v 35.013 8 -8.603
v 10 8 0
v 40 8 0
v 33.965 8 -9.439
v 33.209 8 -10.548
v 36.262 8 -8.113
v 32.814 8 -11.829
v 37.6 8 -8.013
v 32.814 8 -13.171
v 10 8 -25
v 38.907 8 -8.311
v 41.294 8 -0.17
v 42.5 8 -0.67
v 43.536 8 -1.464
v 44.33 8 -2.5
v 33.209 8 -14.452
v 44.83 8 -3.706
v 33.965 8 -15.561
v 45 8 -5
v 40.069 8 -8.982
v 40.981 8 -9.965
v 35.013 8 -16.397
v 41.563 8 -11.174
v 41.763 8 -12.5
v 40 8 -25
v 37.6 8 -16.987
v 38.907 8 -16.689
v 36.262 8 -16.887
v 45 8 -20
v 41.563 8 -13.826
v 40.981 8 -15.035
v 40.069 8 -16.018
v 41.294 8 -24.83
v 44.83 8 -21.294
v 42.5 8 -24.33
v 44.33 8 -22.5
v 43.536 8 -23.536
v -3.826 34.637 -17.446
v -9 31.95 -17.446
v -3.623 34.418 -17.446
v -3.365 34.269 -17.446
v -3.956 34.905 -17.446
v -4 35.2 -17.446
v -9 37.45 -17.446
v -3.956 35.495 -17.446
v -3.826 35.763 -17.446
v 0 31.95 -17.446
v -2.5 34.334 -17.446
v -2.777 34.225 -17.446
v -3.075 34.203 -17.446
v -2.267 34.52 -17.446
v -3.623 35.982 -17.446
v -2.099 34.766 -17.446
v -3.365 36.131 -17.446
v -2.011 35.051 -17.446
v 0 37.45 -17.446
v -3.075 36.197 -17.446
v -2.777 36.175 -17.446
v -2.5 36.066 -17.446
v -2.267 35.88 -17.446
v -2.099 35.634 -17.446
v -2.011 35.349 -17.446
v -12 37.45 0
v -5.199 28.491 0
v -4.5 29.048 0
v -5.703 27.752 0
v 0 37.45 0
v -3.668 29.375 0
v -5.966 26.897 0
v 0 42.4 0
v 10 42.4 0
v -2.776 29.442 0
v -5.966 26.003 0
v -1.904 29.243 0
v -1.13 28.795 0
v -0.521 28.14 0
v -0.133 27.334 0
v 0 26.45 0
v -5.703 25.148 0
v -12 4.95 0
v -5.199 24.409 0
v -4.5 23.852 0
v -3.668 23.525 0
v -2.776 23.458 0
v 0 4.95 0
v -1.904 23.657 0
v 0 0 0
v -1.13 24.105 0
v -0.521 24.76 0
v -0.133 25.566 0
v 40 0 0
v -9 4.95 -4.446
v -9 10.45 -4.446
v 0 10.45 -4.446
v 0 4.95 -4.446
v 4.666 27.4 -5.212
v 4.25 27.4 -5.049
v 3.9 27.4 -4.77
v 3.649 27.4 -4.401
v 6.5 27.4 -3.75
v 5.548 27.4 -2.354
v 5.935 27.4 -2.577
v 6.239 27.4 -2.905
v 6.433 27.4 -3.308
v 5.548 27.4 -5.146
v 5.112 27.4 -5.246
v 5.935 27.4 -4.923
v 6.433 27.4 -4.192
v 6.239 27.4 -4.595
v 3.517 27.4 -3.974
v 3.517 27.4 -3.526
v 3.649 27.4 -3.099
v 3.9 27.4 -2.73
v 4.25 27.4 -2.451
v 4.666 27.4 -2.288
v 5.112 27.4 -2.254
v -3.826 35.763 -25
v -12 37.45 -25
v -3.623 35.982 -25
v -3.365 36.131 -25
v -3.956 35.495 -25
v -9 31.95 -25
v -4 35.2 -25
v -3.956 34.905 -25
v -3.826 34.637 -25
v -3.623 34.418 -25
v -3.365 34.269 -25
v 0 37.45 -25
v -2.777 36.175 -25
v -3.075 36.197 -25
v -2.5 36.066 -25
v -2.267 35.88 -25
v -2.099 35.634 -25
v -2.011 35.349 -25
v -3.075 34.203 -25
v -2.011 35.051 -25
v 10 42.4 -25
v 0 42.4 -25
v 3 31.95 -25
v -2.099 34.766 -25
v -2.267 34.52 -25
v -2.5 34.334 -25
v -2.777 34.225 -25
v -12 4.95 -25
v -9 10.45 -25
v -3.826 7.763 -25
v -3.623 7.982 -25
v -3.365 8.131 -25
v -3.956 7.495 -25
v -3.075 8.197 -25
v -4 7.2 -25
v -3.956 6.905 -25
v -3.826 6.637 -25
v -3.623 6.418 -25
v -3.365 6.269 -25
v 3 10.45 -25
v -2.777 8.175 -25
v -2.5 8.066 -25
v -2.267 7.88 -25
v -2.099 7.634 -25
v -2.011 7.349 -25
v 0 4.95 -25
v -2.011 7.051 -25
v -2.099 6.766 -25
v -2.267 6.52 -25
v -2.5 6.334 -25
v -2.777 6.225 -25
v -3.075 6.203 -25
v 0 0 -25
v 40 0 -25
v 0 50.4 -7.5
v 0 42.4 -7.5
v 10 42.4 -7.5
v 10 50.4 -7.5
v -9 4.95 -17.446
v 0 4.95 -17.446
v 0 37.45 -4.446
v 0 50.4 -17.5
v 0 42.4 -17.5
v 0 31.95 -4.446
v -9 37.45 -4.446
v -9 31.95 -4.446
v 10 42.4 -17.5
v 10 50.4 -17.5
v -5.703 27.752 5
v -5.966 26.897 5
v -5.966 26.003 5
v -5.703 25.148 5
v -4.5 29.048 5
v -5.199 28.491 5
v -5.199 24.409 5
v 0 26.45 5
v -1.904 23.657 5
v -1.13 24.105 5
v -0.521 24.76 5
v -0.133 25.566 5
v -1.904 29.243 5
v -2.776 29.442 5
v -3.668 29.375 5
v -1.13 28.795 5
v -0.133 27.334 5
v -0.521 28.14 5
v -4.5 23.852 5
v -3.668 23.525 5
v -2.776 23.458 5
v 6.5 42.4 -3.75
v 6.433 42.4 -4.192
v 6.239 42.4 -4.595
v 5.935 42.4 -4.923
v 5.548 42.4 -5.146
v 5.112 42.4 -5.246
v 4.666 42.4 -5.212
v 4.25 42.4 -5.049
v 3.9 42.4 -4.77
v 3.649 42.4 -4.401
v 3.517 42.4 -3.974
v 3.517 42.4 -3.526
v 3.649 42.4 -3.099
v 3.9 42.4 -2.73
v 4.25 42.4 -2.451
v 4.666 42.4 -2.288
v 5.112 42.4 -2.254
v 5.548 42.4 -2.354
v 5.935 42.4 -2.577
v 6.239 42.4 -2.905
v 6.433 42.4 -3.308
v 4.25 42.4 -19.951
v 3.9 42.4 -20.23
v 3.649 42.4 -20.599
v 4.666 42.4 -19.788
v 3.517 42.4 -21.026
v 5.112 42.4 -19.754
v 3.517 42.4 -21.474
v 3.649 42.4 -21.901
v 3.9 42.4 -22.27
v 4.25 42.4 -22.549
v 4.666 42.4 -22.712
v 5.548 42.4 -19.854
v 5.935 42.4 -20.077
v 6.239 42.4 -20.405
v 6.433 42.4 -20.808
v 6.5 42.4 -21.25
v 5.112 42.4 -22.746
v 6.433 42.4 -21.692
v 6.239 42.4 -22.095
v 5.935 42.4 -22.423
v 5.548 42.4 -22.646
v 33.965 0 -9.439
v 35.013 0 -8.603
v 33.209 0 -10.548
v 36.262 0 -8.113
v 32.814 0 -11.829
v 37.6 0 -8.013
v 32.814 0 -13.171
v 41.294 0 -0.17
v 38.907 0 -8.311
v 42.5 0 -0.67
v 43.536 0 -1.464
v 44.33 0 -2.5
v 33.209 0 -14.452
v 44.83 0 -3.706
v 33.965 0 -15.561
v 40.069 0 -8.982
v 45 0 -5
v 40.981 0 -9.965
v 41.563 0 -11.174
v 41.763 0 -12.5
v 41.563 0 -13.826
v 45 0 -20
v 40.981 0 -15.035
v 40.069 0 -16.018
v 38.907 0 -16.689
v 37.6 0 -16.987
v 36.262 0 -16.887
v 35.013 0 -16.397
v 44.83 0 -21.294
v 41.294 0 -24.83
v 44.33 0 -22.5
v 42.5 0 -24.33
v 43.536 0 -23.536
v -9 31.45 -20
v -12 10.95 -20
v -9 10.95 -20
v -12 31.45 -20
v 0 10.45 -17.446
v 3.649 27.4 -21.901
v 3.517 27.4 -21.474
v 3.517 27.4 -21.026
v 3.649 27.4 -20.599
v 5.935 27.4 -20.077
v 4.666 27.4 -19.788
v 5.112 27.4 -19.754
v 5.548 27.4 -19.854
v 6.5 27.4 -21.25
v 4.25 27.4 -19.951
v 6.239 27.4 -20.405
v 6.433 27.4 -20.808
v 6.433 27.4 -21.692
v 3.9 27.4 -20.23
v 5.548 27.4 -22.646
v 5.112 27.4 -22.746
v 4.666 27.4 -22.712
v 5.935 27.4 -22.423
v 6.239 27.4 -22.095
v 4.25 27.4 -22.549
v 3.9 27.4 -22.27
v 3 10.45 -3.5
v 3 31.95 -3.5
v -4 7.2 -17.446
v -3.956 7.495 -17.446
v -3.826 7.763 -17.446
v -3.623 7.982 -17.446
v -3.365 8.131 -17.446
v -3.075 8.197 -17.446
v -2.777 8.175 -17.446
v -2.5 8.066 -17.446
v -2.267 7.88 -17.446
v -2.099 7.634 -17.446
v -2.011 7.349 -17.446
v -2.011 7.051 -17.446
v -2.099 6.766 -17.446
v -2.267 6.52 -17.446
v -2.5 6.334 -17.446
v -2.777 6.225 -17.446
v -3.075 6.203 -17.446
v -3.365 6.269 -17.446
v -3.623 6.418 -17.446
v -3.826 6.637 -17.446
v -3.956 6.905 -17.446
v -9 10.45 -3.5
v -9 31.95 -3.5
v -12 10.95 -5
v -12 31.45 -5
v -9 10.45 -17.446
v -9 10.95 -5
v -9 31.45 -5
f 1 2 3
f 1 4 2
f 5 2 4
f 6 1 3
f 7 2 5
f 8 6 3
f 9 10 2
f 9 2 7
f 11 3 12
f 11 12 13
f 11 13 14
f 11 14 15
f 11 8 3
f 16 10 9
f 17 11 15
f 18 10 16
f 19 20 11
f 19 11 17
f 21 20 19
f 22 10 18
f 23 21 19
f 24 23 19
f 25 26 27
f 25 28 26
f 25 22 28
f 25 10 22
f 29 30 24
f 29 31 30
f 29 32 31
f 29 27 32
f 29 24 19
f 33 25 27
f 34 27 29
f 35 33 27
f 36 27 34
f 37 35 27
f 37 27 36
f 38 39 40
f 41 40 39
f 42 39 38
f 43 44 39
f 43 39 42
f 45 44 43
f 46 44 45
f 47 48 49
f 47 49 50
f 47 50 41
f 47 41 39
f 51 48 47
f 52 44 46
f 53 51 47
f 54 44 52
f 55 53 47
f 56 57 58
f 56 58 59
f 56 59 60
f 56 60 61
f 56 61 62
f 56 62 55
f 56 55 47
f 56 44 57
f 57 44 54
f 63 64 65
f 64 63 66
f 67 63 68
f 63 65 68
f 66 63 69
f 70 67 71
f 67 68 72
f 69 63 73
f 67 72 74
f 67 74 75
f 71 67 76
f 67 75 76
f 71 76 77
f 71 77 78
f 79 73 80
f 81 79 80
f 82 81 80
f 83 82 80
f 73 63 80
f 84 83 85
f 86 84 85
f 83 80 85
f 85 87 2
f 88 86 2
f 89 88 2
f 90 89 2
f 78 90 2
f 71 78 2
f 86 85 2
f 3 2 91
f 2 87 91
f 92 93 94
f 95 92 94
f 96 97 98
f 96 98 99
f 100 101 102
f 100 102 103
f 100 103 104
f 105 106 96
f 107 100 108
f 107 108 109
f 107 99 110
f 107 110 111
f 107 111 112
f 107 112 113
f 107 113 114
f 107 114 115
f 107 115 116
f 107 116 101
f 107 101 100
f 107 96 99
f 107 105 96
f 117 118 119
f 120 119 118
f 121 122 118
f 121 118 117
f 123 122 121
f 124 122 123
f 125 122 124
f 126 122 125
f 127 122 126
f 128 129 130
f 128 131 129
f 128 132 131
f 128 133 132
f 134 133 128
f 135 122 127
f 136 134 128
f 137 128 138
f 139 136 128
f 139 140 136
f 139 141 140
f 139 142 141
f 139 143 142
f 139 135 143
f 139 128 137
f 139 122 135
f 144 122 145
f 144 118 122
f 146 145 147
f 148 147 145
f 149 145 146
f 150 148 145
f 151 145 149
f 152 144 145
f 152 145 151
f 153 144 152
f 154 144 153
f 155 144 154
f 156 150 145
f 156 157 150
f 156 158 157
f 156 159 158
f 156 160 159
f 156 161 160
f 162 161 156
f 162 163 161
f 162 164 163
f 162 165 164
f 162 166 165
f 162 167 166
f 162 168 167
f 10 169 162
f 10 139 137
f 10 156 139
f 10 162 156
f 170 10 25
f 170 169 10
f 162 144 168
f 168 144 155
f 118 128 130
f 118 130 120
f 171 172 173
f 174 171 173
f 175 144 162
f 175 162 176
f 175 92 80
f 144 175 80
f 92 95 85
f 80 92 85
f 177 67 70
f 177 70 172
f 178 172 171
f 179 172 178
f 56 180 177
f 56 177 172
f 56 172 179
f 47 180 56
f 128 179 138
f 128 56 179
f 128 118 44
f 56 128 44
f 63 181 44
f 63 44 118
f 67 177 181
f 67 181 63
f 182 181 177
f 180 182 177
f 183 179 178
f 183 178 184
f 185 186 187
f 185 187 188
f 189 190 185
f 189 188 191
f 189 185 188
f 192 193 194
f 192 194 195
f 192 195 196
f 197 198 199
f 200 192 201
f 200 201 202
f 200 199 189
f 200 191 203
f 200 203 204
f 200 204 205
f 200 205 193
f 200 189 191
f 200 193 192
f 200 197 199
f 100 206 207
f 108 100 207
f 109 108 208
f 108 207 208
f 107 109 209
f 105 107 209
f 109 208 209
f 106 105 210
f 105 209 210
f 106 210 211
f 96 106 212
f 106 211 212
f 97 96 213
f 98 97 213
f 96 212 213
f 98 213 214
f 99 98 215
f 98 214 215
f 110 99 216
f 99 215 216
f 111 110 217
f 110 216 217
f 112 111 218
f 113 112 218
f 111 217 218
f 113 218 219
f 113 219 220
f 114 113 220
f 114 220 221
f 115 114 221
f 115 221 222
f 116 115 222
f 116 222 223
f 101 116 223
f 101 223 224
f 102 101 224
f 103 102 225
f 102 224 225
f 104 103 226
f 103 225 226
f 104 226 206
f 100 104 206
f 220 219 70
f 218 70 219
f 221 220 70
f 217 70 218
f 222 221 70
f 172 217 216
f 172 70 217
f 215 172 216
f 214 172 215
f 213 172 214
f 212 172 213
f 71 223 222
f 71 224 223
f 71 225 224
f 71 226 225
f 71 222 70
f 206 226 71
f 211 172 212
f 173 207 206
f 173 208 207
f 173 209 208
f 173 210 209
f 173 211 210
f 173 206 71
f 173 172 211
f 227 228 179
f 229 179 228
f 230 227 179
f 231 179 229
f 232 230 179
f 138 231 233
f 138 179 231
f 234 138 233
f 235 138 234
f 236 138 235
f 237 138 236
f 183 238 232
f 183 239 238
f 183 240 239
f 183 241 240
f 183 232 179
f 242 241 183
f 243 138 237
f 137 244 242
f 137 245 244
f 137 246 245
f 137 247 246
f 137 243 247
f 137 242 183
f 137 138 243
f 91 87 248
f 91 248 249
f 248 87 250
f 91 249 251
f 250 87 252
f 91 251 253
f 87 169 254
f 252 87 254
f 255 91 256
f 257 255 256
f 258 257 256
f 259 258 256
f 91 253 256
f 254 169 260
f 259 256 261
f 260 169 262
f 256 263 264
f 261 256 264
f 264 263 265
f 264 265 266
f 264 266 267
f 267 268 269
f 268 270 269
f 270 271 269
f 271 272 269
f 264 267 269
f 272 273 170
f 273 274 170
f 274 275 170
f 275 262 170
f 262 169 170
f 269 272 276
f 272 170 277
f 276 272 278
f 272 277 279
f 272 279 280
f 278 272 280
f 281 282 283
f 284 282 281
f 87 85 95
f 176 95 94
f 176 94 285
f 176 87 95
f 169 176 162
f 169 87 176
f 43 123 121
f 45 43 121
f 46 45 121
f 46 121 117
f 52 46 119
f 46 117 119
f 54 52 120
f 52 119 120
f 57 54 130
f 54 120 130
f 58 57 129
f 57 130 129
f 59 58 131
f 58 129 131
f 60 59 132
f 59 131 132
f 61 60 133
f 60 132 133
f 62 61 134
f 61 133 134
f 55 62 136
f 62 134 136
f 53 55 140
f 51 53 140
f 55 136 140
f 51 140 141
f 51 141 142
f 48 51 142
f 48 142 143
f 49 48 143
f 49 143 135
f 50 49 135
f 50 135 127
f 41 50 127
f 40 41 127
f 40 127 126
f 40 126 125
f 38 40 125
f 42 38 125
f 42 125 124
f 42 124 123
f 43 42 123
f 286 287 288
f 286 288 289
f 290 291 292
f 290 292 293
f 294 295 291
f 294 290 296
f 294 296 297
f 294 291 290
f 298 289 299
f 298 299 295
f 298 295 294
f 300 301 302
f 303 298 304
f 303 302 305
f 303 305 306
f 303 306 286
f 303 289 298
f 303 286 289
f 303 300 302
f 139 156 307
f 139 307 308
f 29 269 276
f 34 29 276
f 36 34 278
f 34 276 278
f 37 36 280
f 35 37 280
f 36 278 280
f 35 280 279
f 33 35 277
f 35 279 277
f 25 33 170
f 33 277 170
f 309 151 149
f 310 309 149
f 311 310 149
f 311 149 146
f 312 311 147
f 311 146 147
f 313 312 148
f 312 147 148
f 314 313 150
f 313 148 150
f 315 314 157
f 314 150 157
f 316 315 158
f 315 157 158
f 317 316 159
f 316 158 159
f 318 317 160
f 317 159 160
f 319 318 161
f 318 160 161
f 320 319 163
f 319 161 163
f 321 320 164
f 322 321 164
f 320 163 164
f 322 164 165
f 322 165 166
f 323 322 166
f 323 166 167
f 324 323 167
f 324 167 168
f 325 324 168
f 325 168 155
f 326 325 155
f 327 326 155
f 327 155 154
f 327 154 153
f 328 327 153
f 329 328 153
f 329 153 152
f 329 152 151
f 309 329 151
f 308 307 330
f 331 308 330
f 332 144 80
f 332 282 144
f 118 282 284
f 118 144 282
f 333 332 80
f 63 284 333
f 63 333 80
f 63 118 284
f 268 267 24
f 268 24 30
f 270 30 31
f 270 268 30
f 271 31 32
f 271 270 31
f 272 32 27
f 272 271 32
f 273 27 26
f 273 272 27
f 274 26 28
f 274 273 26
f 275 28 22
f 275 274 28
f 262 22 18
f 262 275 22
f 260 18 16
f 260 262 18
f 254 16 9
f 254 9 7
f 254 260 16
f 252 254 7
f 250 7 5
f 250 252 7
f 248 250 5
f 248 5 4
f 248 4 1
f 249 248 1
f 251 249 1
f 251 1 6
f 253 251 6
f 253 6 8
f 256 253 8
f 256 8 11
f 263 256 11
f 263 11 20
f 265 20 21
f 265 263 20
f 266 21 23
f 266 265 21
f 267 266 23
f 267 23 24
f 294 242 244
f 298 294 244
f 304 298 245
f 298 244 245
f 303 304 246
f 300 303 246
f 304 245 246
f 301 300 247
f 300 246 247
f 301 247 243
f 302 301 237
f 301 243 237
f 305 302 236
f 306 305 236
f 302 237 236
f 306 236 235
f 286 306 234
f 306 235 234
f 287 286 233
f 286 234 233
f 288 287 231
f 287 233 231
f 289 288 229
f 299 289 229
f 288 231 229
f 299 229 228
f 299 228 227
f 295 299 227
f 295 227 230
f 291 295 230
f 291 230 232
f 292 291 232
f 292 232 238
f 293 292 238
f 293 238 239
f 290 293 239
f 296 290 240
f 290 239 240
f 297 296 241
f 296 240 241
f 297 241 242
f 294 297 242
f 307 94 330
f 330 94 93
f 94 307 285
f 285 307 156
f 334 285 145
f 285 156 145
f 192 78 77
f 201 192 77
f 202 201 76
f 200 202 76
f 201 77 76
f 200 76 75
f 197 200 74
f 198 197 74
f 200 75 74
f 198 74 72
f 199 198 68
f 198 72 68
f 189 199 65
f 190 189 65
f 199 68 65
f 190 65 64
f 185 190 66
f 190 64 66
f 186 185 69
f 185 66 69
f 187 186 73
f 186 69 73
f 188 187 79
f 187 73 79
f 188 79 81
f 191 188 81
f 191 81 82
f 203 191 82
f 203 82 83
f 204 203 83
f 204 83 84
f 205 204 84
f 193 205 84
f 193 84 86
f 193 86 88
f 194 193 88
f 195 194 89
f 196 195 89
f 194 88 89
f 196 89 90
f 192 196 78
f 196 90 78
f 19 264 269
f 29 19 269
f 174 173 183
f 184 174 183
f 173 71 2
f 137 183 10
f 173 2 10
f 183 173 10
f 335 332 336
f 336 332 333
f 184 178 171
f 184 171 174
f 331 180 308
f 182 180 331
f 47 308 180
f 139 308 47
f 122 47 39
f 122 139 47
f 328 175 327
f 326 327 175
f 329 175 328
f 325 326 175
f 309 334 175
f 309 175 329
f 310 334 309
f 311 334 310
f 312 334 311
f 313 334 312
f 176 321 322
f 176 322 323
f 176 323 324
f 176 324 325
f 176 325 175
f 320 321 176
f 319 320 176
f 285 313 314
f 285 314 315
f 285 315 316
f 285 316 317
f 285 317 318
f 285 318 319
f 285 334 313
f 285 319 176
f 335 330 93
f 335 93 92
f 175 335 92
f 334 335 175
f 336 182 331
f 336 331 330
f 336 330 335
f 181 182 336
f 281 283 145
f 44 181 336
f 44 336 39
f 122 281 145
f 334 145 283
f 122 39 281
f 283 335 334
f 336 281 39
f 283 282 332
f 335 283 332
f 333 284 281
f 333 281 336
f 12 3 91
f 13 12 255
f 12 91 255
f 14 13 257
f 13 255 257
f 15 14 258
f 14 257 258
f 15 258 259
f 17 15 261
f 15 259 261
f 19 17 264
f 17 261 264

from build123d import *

# Parameters (mm, degrees)
SKETCH1_R           = 4.5
BOSS_EXTRUDE1_DEPTH = 8
SKETCH2_W           = 10
SKETCH2_H           = 25
BOSS_EXTRUDE2_DEPTH = 34.4
SKETCH5_W           = 10
SKETCH5_H           = 10
BOSS_EXTRUDE4_DEPTH = 8
SKETCH6_R           = 1.5
CUT_EXTRUDE1_DEPTH  = 15
SKETCH10_W          = 25
SKETCH10_H          = 32.5
BOSS_EXTRUDE6_DEPTH = 12
SKETCH12_W          = 12
SKETCH12_H          = 21.5
CUT_EXTRUDE3_DEPTH  = 21.5
SKETCH13_R          = 1
CUT_EXTRUDE4_DEPTH  = 10
SKETCH14_W          = 9
SKETCH14_H          = 13
CUT_EXTRUDE5_DEPTH  = 38.45
CUT_EXTRUDE6_REACH  = 59
SKETCH15_W          = 15
SKETCH15_H          = 20.5
SKETCH16_R          = 3
BOSS_EXTRUDE7_DEPTH = 5


with BuildPart() as part:
    # Sketch1 → Boss-Extrude1 (new body)
    with BuildSketch(Plane(origin=(0, 0, 0), x_dir=(1, 0, 0), z_dir=(0, 1, 0))):
        with BuildLine():
            Line((0, 0), (40, 0))
            ThreePointArc((40, 0), (43.535533906, 1.464466094), (45, 5))
            Line((45, 5), (45, 20))
            ThreePointArc((45, 20), (43.535533906, 23.535533906), (40, 25))
            Line((40, 25), (0, 25))
            Line((0, 25), (0, 0))
        make_face()
        with Locations((37.263316161, 12.5)):
            Circle(SKETCH1_R, mode=Mode.SUBTRACT)
    extrude(amount=BOSS_EXTRUDE1_DEPTH)

    # Sketch2 → Boss-Extrude2 (add)
    with BuildSketch(Plane(origin=(0, 8, 0), x_dir=(1, 0, 0), z_dir=(0, 1, 0))):
        with Locations((5, 12.5)):
            Rectangle(SKETCH2_W, SKETCH2_H)
    extrude(amount=BOSS_EXTRUDE2_DEPTH)

    # Sketch5 → Boss-Extrude4 (add)
    with BuildSketch(Plane(origin=(0, 42.4, 0), x_dir=(1, 0, 0), z_dir=(0, 1, 0))):
        with Locations((5, 12.5)):
            Rectangle(SKETCH5_W, SKETCH5_H)
    extrude(amount=BOSS_EXTRUDE4_DEPTH)

    # Sketch6 → Cut-Extrude1 (cut)
    with BuildSketch(Plane(origin=(0, 42.4, 0), x_dir=(1, 0, 0), z_dir=(0, 1, 0))):
        with Locations((5, 21.25)):
            Circle(SKETCH6_R)
        with Locations((5, 3.75)):
            Circle(SKETCH6_R)
    extrude(amount=-CUT_EXTRUDE1_DEPTH, mode=Mode.SUBTRACT)

    # Sketch10 → Boss-Extrude6 (add)
    with BuildSketch(Plane.ZY):
        with Locations((-12.5, 21.2)):
            Rectangle(SKETCH10_W, SKETCH10_H)
    extrude(amount=BOSS_EXTRUDE6_DEPTH)

    # Sketch12 → Cut-Extrude3 (cut)
    with BuildSketch(Plane(origin=(0, 0, -25), x_dir=(-1, 0, 0), z_dir=(0, 0, -1))):
        with Locations((3, 21.2)):
            Rectangle(SKETCH12_W, SKETCH12_H)
    extrude(amount=-CUT_EXTRUDE3_DEPTH, mode=Mode.SUBTRACT)

    # Sketch13 → Cut-Extrude4 (cut)
    with BuildSketch(Plane(origin=(0, 0, -25), x_dir=(-1, 0, 0), z_dir=(0, 0, -1))):
        with Locations((3, 35.2)):
            Circle(SKETCH13_R)
        with Locations((3, 7.2)):
            Circle(SKETCH13_R)
    extrude(amount=-CUT_EXTRUDE4_DEPTH, mode=Mode.SUBTRACT)

    # Sketch14 → Cut-Extrude5 (cut, through all)
    with BuildSketch(Plane(origin=(0, 37.45, 0), x_dir=(1, 0, 0), z_dir=(0, 1, 0))):
        with Locations((-4.5, 10.945919096)):
            Rectangle(SKETCH14_W, SKETCH14_H)
    extrude(amount=-CUT_EXTRUDE5_DEPTH, mode=Mode.SUBTRACT)

    # Sketch15 → Cut-Extrude6 (cut, up to next)
    with BuildSketch(Plane.ZY.offset(12), mode=Mode.PRIVATE) as cut_extrude6_sk1:
        with Locations((-12.5, 21.2)):
            Rectangle(SKETCH15_W, SKETCH15_H)
    cut_extrude6_tool1 = extrude(cut_extrude6_sk1.sketch, amount=-CUT_EXTRUDE6_REACH, mode=Mode.PRIVATE) & part.part
    add(cut_extrude6_tool1.solids().sort_by_distance((-12, 21.2, -12.5))[0], mode=Mode.SUBTRACT)

    # Sketch16 → Boss-Extrude7 (add)
    with BuildSketch(Plane.XY):
        with Locations((-3, 26.45)):
            Circle(SKETCH16_R)
    extrude(amount=BOSS_EXTRUDE7_DEPTH)


solid = part.part
